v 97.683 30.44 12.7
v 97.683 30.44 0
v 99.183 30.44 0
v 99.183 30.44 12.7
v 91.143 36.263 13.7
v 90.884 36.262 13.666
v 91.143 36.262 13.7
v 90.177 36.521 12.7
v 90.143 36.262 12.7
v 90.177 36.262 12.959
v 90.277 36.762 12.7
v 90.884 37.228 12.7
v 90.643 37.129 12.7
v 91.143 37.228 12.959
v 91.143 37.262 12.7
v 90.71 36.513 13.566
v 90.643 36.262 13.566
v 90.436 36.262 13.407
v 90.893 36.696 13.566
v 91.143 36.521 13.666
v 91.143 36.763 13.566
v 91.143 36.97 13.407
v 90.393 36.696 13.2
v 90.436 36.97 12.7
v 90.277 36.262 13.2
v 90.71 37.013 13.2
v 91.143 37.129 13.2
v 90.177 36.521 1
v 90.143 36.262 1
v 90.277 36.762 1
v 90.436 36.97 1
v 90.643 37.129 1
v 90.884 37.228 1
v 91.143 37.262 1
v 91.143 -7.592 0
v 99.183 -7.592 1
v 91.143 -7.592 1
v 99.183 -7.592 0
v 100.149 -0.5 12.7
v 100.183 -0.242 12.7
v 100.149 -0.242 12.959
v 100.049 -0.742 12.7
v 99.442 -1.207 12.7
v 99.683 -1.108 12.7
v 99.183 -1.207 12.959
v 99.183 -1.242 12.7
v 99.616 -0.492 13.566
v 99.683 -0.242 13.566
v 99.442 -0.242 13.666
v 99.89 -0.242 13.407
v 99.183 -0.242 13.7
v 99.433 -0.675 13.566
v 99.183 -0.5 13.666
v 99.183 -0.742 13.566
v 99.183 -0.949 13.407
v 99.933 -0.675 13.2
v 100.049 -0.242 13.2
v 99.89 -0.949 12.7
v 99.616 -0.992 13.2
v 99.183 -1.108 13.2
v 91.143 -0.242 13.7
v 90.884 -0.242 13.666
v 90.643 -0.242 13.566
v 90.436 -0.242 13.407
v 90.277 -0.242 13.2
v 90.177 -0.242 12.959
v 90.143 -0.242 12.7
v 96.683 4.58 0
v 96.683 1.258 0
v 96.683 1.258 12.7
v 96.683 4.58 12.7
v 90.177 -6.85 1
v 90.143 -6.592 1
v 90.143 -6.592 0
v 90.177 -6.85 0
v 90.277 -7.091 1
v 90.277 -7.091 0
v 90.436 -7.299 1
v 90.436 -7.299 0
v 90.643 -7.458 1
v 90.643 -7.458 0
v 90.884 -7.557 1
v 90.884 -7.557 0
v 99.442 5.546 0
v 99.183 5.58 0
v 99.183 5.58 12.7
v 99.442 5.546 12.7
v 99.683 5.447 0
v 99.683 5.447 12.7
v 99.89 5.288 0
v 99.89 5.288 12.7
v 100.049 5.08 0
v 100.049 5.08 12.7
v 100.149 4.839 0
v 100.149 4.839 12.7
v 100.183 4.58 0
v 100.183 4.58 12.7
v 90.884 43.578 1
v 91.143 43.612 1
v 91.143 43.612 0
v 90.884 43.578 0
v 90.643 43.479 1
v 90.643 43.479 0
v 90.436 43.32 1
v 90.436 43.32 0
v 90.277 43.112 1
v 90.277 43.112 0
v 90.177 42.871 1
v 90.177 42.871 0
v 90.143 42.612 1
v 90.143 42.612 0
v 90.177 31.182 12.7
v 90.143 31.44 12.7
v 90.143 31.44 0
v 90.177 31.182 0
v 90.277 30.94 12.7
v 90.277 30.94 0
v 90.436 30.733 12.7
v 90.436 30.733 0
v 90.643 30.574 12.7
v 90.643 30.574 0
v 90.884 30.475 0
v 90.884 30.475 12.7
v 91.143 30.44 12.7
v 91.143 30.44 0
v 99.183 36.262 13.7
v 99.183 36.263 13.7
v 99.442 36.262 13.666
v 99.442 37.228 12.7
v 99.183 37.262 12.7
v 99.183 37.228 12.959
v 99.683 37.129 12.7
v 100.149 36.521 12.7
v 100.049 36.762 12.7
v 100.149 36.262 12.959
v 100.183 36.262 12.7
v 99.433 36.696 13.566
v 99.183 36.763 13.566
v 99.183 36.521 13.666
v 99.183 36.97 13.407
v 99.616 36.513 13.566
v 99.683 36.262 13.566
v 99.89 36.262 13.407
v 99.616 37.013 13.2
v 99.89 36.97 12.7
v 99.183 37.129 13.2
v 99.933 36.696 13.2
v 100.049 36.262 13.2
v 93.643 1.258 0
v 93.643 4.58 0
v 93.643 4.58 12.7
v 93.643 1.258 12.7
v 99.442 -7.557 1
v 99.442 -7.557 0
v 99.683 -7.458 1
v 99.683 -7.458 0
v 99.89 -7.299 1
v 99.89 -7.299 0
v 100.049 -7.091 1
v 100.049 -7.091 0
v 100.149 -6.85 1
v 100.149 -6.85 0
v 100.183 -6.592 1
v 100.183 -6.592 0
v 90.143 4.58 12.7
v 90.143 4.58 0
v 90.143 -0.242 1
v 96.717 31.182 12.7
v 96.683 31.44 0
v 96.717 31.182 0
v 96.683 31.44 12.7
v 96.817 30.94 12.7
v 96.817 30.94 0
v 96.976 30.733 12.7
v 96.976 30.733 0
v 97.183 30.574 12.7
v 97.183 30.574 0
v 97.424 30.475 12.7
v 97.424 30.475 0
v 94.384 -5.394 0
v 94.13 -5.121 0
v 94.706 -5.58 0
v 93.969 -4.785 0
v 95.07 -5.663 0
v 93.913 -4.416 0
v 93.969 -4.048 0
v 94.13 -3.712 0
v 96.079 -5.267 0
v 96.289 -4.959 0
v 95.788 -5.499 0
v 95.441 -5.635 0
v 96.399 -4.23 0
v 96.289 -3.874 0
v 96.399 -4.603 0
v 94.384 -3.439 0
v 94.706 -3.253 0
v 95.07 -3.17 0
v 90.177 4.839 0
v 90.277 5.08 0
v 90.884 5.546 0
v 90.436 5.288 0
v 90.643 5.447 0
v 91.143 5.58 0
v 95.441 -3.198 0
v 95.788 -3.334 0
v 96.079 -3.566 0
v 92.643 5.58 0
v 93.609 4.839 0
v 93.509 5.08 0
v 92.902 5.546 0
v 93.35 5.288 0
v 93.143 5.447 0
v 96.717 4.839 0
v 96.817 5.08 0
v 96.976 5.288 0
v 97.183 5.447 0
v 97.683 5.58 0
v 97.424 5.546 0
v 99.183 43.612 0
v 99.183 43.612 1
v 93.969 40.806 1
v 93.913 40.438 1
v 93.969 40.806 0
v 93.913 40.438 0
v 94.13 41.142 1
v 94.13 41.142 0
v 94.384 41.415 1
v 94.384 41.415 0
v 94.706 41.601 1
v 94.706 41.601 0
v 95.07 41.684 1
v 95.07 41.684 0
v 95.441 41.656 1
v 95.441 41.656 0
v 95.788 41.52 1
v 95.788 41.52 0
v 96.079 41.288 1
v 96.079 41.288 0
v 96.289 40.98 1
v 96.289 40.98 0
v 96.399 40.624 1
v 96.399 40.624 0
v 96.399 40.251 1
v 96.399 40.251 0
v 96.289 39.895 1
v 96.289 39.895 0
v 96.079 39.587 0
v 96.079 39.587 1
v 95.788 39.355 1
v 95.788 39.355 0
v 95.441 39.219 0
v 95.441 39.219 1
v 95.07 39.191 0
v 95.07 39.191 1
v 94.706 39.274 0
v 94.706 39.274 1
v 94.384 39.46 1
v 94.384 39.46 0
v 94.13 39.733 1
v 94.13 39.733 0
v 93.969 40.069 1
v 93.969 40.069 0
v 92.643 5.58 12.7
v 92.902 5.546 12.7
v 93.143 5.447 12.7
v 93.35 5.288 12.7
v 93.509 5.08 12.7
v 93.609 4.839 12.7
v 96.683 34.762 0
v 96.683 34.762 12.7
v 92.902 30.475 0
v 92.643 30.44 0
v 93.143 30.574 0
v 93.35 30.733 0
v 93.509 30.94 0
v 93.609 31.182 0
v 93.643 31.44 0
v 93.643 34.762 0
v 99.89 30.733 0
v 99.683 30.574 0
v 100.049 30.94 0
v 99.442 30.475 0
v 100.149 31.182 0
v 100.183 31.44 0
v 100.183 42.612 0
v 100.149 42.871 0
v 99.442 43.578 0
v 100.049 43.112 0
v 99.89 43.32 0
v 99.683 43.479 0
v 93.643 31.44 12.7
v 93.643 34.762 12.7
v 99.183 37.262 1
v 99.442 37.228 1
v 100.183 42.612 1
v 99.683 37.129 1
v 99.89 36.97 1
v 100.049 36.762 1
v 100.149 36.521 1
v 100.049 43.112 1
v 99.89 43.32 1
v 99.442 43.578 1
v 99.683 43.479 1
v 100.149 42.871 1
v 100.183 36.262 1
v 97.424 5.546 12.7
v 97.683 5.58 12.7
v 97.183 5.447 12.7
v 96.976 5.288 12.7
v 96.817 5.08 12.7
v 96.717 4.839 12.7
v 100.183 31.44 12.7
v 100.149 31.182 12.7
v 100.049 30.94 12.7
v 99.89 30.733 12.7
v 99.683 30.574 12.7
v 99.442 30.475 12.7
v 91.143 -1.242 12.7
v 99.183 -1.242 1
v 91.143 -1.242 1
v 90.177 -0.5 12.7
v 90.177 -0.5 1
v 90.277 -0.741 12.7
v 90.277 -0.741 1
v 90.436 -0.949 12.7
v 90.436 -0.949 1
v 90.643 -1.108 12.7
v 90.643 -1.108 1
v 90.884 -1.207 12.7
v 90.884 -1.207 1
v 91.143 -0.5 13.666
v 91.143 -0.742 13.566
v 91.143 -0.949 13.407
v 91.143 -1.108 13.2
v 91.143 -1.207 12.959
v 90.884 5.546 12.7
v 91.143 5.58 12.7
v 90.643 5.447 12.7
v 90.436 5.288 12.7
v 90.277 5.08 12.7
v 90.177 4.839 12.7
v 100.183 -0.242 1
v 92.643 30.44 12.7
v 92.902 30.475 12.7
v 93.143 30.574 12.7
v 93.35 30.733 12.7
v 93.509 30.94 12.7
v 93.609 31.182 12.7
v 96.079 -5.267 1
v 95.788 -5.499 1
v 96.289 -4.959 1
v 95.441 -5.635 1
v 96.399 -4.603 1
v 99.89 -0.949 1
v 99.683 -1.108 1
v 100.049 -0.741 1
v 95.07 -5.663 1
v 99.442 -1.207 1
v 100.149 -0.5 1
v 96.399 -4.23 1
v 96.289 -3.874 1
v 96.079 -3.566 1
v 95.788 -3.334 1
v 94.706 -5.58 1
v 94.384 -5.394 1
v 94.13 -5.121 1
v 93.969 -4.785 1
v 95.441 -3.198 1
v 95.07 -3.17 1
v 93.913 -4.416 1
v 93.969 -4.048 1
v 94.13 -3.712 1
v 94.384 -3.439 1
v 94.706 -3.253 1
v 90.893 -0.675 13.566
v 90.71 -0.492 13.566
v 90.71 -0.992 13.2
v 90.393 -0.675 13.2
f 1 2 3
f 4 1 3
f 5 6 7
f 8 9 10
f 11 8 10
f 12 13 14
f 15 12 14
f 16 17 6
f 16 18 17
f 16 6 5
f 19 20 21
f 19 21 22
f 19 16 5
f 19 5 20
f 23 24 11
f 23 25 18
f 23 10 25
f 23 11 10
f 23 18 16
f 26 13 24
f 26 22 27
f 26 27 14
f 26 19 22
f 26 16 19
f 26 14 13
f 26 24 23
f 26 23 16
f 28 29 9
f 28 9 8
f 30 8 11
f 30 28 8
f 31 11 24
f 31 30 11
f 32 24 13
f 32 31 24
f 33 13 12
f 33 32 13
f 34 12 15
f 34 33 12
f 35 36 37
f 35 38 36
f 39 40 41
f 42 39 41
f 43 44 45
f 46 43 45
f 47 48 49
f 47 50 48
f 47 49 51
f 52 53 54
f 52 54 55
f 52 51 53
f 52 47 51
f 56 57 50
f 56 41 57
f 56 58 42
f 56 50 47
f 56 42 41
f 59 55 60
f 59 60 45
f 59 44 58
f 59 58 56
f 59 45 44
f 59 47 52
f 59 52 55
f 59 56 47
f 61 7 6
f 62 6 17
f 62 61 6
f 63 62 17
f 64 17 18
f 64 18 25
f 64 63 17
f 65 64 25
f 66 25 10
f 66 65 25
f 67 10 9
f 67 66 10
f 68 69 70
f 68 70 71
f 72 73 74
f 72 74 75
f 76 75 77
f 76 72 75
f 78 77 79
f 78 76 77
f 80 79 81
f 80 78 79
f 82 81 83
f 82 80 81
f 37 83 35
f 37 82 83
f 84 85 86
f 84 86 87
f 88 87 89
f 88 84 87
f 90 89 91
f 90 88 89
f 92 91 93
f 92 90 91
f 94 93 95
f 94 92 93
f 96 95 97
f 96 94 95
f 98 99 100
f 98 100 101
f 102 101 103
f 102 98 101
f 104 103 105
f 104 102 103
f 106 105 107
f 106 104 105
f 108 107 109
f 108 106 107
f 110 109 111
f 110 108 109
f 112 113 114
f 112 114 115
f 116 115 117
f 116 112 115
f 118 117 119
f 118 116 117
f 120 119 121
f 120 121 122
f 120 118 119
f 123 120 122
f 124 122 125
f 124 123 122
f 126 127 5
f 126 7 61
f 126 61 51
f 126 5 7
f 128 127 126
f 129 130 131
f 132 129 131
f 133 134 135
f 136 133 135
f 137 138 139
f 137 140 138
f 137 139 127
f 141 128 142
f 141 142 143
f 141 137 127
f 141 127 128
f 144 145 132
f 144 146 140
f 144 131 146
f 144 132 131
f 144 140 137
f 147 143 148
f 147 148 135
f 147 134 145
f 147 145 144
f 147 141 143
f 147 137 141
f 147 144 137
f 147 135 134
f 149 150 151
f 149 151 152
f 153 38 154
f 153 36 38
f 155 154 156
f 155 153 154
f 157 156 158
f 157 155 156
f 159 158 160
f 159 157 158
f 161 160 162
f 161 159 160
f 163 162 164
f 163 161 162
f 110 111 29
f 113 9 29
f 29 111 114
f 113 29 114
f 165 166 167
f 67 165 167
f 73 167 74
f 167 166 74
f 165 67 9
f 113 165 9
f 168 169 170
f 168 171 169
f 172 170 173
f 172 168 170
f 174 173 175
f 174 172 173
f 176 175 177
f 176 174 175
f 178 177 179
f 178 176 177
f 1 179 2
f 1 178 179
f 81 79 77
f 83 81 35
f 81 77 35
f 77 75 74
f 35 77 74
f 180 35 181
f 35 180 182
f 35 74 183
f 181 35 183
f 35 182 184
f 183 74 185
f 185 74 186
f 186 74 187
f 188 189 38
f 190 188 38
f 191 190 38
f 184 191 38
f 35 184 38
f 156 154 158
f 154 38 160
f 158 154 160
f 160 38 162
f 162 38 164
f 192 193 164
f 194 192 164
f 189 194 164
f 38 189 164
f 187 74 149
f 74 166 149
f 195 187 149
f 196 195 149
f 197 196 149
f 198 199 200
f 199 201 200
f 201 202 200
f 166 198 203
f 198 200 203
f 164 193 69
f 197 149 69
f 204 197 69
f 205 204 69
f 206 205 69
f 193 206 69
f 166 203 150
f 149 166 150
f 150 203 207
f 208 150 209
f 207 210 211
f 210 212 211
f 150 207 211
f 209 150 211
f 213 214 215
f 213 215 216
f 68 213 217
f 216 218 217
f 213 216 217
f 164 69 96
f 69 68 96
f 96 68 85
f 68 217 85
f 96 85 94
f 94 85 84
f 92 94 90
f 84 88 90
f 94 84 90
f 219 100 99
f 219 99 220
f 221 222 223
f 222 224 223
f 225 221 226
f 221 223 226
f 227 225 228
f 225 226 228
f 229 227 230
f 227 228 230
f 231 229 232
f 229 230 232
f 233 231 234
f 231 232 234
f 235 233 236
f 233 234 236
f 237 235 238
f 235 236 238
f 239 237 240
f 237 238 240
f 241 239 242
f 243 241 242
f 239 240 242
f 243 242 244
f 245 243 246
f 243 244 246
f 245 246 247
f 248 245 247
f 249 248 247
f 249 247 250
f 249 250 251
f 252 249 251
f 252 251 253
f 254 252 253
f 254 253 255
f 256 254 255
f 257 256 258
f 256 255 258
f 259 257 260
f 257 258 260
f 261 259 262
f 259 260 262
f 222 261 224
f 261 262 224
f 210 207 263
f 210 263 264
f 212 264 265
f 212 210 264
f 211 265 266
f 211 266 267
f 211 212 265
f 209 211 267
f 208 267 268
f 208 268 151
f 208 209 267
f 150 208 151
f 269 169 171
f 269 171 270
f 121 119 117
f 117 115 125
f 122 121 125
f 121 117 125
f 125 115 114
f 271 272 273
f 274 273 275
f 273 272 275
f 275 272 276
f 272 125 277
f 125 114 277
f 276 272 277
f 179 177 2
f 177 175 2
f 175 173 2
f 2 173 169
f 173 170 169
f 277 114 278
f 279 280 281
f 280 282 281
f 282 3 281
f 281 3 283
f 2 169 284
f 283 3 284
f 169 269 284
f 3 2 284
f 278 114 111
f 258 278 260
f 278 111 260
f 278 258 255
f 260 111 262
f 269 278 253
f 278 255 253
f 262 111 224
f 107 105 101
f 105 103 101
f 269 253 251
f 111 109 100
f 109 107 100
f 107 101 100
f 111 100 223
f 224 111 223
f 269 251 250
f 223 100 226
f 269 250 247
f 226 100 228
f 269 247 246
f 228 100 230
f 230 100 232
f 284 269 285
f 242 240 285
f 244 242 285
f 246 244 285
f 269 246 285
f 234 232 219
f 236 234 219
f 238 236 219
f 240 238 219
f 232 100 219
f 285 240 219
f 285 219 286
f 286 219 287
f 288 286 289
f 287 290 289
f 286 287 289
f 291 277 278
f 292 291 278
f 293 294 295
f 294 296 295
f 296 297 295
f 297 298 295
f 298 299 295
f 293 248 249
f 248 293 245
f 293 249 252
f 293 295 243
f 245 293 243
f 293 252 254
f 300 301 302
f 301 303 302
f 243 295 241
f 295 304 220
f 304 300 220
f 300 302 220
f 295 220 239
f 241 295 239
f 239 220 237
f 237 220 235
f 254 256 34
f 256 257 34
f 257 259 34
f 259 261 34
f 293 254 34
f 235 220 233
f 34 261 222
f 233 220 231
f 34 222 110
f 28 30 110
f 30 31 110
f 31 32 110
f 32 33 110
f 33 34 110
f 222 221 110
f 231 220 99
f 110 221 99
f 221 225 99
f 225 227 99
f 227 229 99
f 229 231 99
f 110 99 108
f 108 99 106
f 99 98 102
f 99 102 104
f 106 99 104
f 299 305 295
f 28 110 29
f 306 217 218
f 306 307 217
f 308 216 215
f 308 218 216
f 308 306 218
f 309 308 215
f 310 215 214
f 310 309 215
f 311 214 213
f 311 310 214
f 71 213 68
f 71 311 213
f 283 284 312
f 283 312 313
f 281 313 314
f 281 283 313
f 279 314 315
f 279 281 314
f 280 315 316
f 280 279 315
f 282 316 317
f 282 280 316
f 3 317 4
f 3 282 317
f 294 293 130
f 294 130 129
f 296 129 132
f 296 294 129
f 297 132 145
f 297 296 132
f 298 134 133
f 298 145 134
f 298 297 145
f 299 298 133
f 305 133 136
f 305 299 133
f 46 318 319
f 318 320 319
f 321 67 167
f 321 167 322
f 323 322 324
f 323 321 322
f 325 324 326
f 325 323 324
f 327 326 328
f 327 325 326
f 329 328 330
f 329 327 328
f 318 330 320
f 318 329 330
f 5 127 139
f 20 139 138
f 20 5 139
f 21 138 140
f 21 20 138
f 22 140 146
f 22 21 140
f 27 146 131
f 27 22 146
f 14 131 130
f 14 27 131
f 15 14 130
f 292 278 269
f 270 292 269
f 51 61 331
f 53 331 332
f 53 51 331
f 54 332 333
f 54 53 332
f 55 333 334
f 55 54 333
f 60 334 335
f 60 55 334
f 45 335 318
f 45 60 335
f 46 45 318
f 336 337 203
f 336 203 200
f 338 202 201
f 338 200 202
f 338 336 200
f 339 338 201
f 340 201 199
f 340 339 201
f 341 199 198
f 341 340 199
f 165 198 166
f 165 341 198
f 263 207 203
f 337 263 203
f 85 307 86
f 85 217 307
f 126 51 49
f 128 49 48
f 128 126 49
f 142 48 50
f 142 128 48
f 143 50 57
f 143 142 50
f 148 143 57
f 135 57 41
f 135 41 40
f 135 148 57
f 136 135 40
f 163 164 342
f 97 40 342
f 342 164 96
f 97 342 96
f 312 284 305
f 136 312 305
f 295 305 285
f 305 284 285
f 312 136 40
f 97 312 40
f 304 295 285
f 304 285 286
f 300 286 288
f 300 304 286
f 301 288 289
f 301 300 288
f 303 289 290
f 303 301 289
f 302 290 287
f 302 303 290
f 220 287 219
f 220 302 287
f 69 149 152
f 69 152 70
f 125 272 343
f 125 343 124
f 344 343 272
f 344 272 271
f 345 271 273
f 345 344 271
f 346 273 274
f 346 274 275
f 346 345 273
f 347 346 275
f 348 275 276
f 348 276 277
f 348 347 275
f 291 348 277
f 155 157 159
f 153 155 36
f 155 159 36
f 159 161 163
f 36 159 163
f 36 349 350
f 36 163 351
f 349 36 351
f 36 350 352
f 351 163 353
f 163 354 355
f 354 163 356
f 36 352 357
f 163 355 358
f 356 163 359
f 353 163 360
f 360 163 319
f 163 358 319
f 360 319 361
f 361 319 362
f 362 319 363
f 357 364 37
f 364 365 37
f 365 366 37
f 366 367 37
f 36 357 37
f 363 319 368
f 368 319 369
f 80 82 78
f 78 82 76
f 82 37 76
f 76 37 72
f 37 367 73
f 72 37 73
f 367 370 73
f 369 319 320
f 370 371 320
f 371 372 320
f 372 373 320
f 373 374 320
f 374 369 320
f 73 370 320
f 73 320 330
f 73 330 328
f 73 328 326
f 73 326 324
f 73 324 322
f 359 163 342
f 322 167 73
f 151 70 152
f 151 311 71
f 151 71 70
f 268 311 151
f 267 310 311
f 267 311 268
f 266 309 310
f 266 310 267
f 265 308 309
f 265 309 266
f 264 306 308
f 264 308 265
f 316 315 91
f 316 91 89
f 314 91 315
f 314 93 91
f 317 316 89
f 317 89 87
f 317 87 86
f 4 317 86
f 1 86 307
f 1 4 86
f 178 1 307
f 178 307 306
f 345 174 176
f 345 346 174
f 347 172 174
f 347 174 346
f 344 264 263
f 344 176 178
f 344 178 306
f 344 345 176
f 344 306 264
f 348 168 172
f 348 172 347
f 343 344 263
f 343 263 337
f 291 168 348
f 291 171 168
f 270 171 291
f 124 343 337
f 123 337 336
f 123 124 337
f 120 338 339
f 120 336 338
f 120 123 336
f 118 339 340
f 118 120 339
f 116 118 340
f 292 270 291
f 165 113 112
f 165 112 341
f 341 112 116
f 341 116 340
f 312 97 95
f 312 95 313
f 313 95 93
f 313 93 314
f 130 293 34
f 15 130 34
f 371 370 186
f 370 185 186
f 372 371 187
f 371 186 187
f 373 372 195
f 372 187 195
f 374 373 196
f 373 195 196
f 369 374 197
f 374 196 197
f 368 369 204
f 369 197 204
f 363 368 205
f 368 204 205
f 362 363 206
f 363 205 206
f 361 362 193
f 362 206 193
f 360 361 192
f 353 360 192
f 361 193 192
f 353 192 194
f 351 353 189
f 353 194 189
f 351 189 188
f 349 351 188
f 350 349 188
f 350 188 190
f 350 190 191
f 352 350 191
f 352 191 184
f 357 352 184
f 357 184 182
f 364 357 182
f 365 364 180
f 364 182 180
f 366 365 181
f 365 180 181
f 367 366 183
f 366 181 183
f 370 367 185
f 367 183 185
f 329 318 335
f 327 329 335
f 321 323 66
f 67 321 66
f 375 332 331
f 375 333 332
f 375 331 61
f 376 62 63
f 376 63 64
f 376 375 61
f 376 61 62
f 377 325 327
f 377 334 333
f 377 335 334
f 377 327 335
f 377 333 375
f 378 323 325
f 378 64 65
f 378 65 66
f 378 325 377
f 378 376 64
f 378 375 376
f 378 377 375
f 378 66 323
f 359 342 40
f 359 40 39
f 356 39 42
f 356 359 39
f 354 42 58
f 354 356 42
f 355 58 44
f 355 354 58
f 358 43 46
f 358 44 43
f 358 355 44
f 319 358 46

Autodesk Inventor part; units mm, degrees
ref_plane "YZ Plane" through (0, 0, 0) normal (1, 0, 0) x (0, 1, 0)
ref_plane "XZ Plane" through (0, 0, 0) normal (0, 1, 0) x (-1, 0, 0)
ref_plane "XY Plane" through (0, 0, 0) normal (0, 0, 1) x (1, 0, 0)
sketch "Sketch1" plane through (0, 0, 0) normal (0, 0, 1) x (1, 0, 0)
  line L0 (93.893, 28.1705) -> (89.575, 28.1705) projected
  line L1 (89.575, 12.9305) -> (89.575, 28.1705) projected
  line L2 (89.575, 7.8505) -> (89.575, 12.9305) projected
  line L3 (93.893, 7.8505) -> (89.575, 7.8505) projected
  line L4 (93.893, 7.8505) -> (93.893, 2.0085) projected
  line L5 (93.893, 2.0085) -> (96.433, 2.0085) projected
  line L6 (96.433, 7.8505) -> (96.433, 2.0085) projected
  line L7 (112.435, 7.8505) -> (96.433, 7.8505) projected
  line L8 (112.435, 7.8505) -> (112.435, 28.1705) projected
  line L9 (112.435, 28.1705) -> (96.433, 28.1705) projected
  line L10 (96.433, 34.0125) -> (96.433, 28.1705) projected
  line L11 (93.893, 34.0125) -> (96.433, 34.0125) projected
  line L12 (93.893, 34.0125) -> (93.893, 28.1705) projected
  line L13 (93.893, 6.5805) -> (89.575, 6.5805) projected
  line L14 (112.435, 6.5805) -> (96.433, 6.5805) projected
  line L15 (93.893, 29.4405) -> (89.575, 29.4405) projected
  line L16 (112.435, 29.4405) -> (96.433, 29.4405) projected
  line L17 (93.893, 6.5805) -> (93.643, 6.5805)
  line L18 (93.643, 6.5805) -> (93.643, 2.0085)
  line L19 (93.643, 2.0085) -> (93.643, 1.7585)
  line L20 (93.643, 1.7585) -> (90.143, 1.7585)
  line L21 (90.143, 1.7585) -> (90.143, 6.5805)
  line L22 (95.163, 2.0085) -> (95.163, 1.3114)
  line L23 (96.683, 6.5805) -> (96.683, 2.0085)
  line L24 (96.683, 2.0085) -> (96.683, 1.7585)
  line L25 (96.683, 1.7585) -> (100.183, 1.7585)
  line L26 (100.183, 1.7585) -> (100.183, 6.5805)
  line L27 (90.143, 1.7585) -> (100.183, 1.7585)
  line L28 (100.183, 1.7585) -> (100.183, -1.2415)
  line L29 (100.183, -1.2415) -> (90.143, -1.2415)
  line L30 (90.143, -1.2415) -> (90.143, 1.7585)
  line L31 (112.435, 18.0105) -> (108.4742, 18.0105)
  line L32 (93.893, 28.1705) -> (93.893, 34.0125)
  line L33 (93.893, 34.0125) -> (96.433, 34.0125)
  line L34 (96.433, 28.1705) -> (96.433, 34.0125)
  line L35 (112.435, 6.5805) -> (96.433, 6.5805)
  line L36 (93.643, 29.4405) -> (93.643, 34.0125)
  line L37 (93.643, 34.0125) -> (93.643, 34.2625)
  line L38 (93.643, 34.2625) -> (90.143, 34.2625)
  line L39 (90.143, 34.2625) -> (90.143, 29.4405)
  line L40 (95.163, 34.0125) -> (95.163, 34.7096)
  line L41 (96.683, 29.4405) -> (96.683, 34.0125)
  line L42 (100.183, 34.2625) -> (100.183, 29.4405)
  line L43 (96.683, 34.0125) -> (96.683, 34.2625)
  line L44 (96.683, 34.2625) -> (100.183, 34.2625)
  line L45 (90.143, 34.2625) -> (100.183, 34.2625)
  line L46 (100.183, 34.2625) -> (100.183, 37.2625)
  line L47 (100.183, 37.2625) -> (90.143, 37.2625)
  line L48 (90.143, 37.2625) -> (90.143, 34.2625)
  line L49 (96.683, 6.5805) -> (100.183, 6.5805)
  line L50 (100.183, 6.5805) -> (100.183, -1.2415)
  line L51 (100.183, -1.2415) -> (96.683, -1.2415)
  line L52 (96.683, -1.2415) -> (96.683, 6.5805)
  line L53 (96.683, 29.4405) -> (100.183, 29.4405)
  line L54 (100.183, 29.4405) -> (100.183, 37.2625)
  line L55 (100.183, 37.2625) -> (96.683, 37.2625)
  line L56 (96.683, 37.2625) -> (96.683, 29.4405)
  line L57 (90.143, 29.4405) -> (93.643, 29.4405)
  line L58 (93.643, 29.4405) -> (93.643, 37.2625)
  line L59 (93.643, 37.2625) -> (90.143, 37.2625)
  line L60 (90.143, 37.2625) -> (90.143, 29.4405)
  point P0 (0, 0)
  dimension "d0" = 0.25
  dimension "d1" = 0.25
  dimension "d2" = 3.5
  dimension "d3" = 3
extrude "Extrusion1" add sketch "Sketch1" along normal blind 12.7 contours L15 L39 L38 L37 L36 | L45 L58 L47 L56 | L48 L47 L58 L38 | L44 L42 L16 L41 L43 | L56 L47 L46 L44 | L18 L19 L20 L21 L13 | L27 L52 L29 L30 L20 | L24 L23 L14 L26 L25 | L25 L28 L29 L52
sketch "Sketch2" plane through (0, 0, 12.7) normal (0, 0, 1) x (1, 0, 0)
  line L0 (90.143, 6.5805) -> (90.143, -1.2415) projected
  line L1 (100.183, 29.4405) -> (100.183, 37.2625) projected
  line L2 (90.143, -1.2415) -> (100.183, -1.2415)
  line L3 (100.183, -1.2415) -> (100.183, 37.2625)
  line L4 (100.183, 37.2625) -> (90.143, 37.2625)
  line L5 (90.143, 37.2625) -> (90.143, -1.2415)
  point P0 (0, 0)
extrude "Extrusion2" add sketch "Sketch2" along normal blind 1
sketch "Sketch3" plane through (0, 0, 0) normal (0, 0, -1) x (-1, 0, 0)
  line L0 (-90.143, -1.2415) -> (-100.183, -1.2415) projected
  line L1 (-100.183, 37.2625) -> (-90.143, 37.2625) projected
  line L2 (-90.143, -1.2415) -> (-100.183, -1.2415)
  line L3 (-100.183, -1.2415) -> (-100.183, -7.5915)
  line L4 (-100.183, -7.5915) -> (-90.143, -7.5915)
  line L5 (-90.143, -7.5915) -> (-90.143, -1.2415)
  line L6 (-100.183, 29.4405) -> (-100.183, 37.2625) projected
  line L7 (-100.183, 37.2625) -> (-90.143, 37.2625)
  line L8 (-90.143, 37.2625) -> (-90.143, 43.6125)
  line L9 (-90.143, 43.6125) -> (-100.183, 43.6125)
  line L10 (-100.183, 43.6125) -> (-100.183, 37.2625)
  circle A0 centre (-95.163, -4.4165) radius 1.25
  circle A1 centre (-95.163, 40.4375) radius 1.25
  point P0 (0, 0)
  point P1 (-90.143, -4.4165)
  point P2 (-90.143, 40.4375)
  point P3 (-95.163, 43.6125)
  point P4 (-95.163, -7.5915)
  dimension "d8" = 6.35
  dimension "d9" = 6.35
  dimension "d10" = 2.5
  dimension "d11" = 2.5
extrude "Extrusion3" add sketch "Sketch3" against normal blind 1
fillet "Fillet2" radius 1 4 edges at (90.143, 43.6125, 0.5) (100.183, 43.6125, 0.5) (90.143, -7.5915, 0.5) (100.183, -7.5915, 0.5)
sketch "Sketch4" plane through (0, 0, 0) normal (0, 0, -1) x (-1, 0, 0)
  line L0 (-100.183, 6.5805) -> (-96.683, 6.5805) projected
  line L1 (-96.683, 6.5805) -> (-96.683, 5.5805)
  line L2 (-96.683, 6.5805) -> (-96.683, 1.7585) projected
  line L3 (-96.683, 5.5805) -> (-100.1874, 5.5805)
  line L4 (-100.1874, 5.5805) -> (-100.1874, 6.5805)
  line L5 (-100.1874, 6.5805) -> (-96.683, 6.5805)
  line L6 (-94.143, 2.0085) -> (-94.143, 7.8505) projected
  line L7 (-94.143, 6.5805) -> (-89.825, 6.5805) projected
  line L8 (-90.143, 29.4405) -> (-90.143, 6.5805) projected
  line L9 (-94.143, 5.5805) -> (-90.143, 5.5805)
  line L10 (-90.143, 5.5805) -> (-90.143, 6.5805)
  line L11 (-90.143, 6.5805) -> (-94.143, 6.5805)
  line L12 (-94.143, 6.5805) -> (-94.143, 5.5805)
  line L13 (-100.183, 6.5805) -> (-100.183, 29.4405) projected
  line L14 (-100.183, 18.0105) -> (-103.7607, 18.0105)
  line L15 (-100.183, 29.4405) -> (-96.683, 29.4405)
  line L16 (-96.683, 29.4405) -> (-96.683, 30.4405)
  line L17 (-96.683, 29.4405) -> (-96.683, 34.2625)
  line L18 (-96.683, 30.4405) -> (-100.1874, 30.4405)
  line L19 (-100.1874, 30.4405) -> (-100.1874, 29.4405)
  line L20 (-100.1874, 29.4405) -> (-96.683, 29.4405)
  line L21 (-94.143, 34.0125) -> (-94.143, 28.1705)
  line L22 (-94.143, 29.4405) -> (-89.825, 29.4405)
  line L23 (-90.143, 6.5805) -> (-90.143, 29.4405)
  line L24 (-94.143, 30.4405) -> (-90.143, 30.4405)
  line L25 (-90.143, 30.4405) -> (-90.143, 29.4405)
  line L26 (-90.143, 29.4405) -> (-94.143, 29.4405)
  line L27 (-94.143, 29.4405) -> (-94.143, 30.4405)
  line L28 (-100.183, 29.4405) -> (-100.183, 6.5805)
  point P0 (0, 0)
  dimension "d17" = 1
  dimension "d23" = 1
extrude "Extrusion4" cut sketch "Sketch4" against normal up to surface (12.7 mm away)
fillet "Fillet4" radius 1 8 edges at (96.683, 5.5805, 6.35) (100.183, 5.5805, 6.35) (93.643, 5.5805, 6.35) (90.143, 5.5805, 6.35) (100.183, 30.4405, 6.35) (96.683, 30.4405, 6.35) (93.643, 30.4405, 6.35) (90.143, 30.4405, 6.35)
fillet "Fillet5" radius 1 4 edges at (100.183, -1.2415, 7.35) (90.143, -1.2415, 7.35) (100.183, 37.2625, 7.35) (90.143, 37.2625, 7.35)
fillet "Fillet6" radius 1 8 edges at (90.4359, -0.9486, 13.7) (95.163, -1.2415, 13.7) (99.8901, -0.9486, 13.7) (100.183, 18.0105, 13.7) (99.8901, 36.9696, 13.7) (95.163, 37.2625, 13.7) (90.4359, 36.9696, 13.7) (90.143, 18.0105, 13.7)
sketch "Sketch5" plane through (0, 0, 0) normal (0, 0, -1) x (-1, 0, 0)
  line L0 (-96.683, 1.7585) -> (-93.643, 1.7585) projected
  line L1 (-96.683, 1.7585) -> (-93.643, 1.7585)
  line L2 (-93.643, 1.7585) -> (-93.643, 1.2585)
  line L3 (-93.643, 1.2585) -> (-96.683, 1.2585)
  line L4 (-96.683, 1.2585) -> (-96.683, 1.7585)
  line L5 (-100.183, 4.5805) -> (-100.183, 31.4405) projected
  line L6 (-100.183, 18.0105) -> (-106.4704, 18.0105)
  line L7 (-96.683, 34.2625) -> (-93.643, 34.2625)
  line L8 (-96.683, 34.2625) -> (-93.643, 34.2625)
  line L9 (-93.643, 34.2625) -> (-93.643, 34.7625)
  line L10 (-93.643, 34.7625) -> (-96.683, 34.7625)
  line L11 (-96.683, 34.7625) -> (-96.683, 34.2625)
  point P0 (0, 0)
  dimension "d24" = 0.5
extrude "Extrusion5" cut sketch "Sketch5" against normal up to surface (12.7 mm away)
properties part number "BackWheelServoClasp"
